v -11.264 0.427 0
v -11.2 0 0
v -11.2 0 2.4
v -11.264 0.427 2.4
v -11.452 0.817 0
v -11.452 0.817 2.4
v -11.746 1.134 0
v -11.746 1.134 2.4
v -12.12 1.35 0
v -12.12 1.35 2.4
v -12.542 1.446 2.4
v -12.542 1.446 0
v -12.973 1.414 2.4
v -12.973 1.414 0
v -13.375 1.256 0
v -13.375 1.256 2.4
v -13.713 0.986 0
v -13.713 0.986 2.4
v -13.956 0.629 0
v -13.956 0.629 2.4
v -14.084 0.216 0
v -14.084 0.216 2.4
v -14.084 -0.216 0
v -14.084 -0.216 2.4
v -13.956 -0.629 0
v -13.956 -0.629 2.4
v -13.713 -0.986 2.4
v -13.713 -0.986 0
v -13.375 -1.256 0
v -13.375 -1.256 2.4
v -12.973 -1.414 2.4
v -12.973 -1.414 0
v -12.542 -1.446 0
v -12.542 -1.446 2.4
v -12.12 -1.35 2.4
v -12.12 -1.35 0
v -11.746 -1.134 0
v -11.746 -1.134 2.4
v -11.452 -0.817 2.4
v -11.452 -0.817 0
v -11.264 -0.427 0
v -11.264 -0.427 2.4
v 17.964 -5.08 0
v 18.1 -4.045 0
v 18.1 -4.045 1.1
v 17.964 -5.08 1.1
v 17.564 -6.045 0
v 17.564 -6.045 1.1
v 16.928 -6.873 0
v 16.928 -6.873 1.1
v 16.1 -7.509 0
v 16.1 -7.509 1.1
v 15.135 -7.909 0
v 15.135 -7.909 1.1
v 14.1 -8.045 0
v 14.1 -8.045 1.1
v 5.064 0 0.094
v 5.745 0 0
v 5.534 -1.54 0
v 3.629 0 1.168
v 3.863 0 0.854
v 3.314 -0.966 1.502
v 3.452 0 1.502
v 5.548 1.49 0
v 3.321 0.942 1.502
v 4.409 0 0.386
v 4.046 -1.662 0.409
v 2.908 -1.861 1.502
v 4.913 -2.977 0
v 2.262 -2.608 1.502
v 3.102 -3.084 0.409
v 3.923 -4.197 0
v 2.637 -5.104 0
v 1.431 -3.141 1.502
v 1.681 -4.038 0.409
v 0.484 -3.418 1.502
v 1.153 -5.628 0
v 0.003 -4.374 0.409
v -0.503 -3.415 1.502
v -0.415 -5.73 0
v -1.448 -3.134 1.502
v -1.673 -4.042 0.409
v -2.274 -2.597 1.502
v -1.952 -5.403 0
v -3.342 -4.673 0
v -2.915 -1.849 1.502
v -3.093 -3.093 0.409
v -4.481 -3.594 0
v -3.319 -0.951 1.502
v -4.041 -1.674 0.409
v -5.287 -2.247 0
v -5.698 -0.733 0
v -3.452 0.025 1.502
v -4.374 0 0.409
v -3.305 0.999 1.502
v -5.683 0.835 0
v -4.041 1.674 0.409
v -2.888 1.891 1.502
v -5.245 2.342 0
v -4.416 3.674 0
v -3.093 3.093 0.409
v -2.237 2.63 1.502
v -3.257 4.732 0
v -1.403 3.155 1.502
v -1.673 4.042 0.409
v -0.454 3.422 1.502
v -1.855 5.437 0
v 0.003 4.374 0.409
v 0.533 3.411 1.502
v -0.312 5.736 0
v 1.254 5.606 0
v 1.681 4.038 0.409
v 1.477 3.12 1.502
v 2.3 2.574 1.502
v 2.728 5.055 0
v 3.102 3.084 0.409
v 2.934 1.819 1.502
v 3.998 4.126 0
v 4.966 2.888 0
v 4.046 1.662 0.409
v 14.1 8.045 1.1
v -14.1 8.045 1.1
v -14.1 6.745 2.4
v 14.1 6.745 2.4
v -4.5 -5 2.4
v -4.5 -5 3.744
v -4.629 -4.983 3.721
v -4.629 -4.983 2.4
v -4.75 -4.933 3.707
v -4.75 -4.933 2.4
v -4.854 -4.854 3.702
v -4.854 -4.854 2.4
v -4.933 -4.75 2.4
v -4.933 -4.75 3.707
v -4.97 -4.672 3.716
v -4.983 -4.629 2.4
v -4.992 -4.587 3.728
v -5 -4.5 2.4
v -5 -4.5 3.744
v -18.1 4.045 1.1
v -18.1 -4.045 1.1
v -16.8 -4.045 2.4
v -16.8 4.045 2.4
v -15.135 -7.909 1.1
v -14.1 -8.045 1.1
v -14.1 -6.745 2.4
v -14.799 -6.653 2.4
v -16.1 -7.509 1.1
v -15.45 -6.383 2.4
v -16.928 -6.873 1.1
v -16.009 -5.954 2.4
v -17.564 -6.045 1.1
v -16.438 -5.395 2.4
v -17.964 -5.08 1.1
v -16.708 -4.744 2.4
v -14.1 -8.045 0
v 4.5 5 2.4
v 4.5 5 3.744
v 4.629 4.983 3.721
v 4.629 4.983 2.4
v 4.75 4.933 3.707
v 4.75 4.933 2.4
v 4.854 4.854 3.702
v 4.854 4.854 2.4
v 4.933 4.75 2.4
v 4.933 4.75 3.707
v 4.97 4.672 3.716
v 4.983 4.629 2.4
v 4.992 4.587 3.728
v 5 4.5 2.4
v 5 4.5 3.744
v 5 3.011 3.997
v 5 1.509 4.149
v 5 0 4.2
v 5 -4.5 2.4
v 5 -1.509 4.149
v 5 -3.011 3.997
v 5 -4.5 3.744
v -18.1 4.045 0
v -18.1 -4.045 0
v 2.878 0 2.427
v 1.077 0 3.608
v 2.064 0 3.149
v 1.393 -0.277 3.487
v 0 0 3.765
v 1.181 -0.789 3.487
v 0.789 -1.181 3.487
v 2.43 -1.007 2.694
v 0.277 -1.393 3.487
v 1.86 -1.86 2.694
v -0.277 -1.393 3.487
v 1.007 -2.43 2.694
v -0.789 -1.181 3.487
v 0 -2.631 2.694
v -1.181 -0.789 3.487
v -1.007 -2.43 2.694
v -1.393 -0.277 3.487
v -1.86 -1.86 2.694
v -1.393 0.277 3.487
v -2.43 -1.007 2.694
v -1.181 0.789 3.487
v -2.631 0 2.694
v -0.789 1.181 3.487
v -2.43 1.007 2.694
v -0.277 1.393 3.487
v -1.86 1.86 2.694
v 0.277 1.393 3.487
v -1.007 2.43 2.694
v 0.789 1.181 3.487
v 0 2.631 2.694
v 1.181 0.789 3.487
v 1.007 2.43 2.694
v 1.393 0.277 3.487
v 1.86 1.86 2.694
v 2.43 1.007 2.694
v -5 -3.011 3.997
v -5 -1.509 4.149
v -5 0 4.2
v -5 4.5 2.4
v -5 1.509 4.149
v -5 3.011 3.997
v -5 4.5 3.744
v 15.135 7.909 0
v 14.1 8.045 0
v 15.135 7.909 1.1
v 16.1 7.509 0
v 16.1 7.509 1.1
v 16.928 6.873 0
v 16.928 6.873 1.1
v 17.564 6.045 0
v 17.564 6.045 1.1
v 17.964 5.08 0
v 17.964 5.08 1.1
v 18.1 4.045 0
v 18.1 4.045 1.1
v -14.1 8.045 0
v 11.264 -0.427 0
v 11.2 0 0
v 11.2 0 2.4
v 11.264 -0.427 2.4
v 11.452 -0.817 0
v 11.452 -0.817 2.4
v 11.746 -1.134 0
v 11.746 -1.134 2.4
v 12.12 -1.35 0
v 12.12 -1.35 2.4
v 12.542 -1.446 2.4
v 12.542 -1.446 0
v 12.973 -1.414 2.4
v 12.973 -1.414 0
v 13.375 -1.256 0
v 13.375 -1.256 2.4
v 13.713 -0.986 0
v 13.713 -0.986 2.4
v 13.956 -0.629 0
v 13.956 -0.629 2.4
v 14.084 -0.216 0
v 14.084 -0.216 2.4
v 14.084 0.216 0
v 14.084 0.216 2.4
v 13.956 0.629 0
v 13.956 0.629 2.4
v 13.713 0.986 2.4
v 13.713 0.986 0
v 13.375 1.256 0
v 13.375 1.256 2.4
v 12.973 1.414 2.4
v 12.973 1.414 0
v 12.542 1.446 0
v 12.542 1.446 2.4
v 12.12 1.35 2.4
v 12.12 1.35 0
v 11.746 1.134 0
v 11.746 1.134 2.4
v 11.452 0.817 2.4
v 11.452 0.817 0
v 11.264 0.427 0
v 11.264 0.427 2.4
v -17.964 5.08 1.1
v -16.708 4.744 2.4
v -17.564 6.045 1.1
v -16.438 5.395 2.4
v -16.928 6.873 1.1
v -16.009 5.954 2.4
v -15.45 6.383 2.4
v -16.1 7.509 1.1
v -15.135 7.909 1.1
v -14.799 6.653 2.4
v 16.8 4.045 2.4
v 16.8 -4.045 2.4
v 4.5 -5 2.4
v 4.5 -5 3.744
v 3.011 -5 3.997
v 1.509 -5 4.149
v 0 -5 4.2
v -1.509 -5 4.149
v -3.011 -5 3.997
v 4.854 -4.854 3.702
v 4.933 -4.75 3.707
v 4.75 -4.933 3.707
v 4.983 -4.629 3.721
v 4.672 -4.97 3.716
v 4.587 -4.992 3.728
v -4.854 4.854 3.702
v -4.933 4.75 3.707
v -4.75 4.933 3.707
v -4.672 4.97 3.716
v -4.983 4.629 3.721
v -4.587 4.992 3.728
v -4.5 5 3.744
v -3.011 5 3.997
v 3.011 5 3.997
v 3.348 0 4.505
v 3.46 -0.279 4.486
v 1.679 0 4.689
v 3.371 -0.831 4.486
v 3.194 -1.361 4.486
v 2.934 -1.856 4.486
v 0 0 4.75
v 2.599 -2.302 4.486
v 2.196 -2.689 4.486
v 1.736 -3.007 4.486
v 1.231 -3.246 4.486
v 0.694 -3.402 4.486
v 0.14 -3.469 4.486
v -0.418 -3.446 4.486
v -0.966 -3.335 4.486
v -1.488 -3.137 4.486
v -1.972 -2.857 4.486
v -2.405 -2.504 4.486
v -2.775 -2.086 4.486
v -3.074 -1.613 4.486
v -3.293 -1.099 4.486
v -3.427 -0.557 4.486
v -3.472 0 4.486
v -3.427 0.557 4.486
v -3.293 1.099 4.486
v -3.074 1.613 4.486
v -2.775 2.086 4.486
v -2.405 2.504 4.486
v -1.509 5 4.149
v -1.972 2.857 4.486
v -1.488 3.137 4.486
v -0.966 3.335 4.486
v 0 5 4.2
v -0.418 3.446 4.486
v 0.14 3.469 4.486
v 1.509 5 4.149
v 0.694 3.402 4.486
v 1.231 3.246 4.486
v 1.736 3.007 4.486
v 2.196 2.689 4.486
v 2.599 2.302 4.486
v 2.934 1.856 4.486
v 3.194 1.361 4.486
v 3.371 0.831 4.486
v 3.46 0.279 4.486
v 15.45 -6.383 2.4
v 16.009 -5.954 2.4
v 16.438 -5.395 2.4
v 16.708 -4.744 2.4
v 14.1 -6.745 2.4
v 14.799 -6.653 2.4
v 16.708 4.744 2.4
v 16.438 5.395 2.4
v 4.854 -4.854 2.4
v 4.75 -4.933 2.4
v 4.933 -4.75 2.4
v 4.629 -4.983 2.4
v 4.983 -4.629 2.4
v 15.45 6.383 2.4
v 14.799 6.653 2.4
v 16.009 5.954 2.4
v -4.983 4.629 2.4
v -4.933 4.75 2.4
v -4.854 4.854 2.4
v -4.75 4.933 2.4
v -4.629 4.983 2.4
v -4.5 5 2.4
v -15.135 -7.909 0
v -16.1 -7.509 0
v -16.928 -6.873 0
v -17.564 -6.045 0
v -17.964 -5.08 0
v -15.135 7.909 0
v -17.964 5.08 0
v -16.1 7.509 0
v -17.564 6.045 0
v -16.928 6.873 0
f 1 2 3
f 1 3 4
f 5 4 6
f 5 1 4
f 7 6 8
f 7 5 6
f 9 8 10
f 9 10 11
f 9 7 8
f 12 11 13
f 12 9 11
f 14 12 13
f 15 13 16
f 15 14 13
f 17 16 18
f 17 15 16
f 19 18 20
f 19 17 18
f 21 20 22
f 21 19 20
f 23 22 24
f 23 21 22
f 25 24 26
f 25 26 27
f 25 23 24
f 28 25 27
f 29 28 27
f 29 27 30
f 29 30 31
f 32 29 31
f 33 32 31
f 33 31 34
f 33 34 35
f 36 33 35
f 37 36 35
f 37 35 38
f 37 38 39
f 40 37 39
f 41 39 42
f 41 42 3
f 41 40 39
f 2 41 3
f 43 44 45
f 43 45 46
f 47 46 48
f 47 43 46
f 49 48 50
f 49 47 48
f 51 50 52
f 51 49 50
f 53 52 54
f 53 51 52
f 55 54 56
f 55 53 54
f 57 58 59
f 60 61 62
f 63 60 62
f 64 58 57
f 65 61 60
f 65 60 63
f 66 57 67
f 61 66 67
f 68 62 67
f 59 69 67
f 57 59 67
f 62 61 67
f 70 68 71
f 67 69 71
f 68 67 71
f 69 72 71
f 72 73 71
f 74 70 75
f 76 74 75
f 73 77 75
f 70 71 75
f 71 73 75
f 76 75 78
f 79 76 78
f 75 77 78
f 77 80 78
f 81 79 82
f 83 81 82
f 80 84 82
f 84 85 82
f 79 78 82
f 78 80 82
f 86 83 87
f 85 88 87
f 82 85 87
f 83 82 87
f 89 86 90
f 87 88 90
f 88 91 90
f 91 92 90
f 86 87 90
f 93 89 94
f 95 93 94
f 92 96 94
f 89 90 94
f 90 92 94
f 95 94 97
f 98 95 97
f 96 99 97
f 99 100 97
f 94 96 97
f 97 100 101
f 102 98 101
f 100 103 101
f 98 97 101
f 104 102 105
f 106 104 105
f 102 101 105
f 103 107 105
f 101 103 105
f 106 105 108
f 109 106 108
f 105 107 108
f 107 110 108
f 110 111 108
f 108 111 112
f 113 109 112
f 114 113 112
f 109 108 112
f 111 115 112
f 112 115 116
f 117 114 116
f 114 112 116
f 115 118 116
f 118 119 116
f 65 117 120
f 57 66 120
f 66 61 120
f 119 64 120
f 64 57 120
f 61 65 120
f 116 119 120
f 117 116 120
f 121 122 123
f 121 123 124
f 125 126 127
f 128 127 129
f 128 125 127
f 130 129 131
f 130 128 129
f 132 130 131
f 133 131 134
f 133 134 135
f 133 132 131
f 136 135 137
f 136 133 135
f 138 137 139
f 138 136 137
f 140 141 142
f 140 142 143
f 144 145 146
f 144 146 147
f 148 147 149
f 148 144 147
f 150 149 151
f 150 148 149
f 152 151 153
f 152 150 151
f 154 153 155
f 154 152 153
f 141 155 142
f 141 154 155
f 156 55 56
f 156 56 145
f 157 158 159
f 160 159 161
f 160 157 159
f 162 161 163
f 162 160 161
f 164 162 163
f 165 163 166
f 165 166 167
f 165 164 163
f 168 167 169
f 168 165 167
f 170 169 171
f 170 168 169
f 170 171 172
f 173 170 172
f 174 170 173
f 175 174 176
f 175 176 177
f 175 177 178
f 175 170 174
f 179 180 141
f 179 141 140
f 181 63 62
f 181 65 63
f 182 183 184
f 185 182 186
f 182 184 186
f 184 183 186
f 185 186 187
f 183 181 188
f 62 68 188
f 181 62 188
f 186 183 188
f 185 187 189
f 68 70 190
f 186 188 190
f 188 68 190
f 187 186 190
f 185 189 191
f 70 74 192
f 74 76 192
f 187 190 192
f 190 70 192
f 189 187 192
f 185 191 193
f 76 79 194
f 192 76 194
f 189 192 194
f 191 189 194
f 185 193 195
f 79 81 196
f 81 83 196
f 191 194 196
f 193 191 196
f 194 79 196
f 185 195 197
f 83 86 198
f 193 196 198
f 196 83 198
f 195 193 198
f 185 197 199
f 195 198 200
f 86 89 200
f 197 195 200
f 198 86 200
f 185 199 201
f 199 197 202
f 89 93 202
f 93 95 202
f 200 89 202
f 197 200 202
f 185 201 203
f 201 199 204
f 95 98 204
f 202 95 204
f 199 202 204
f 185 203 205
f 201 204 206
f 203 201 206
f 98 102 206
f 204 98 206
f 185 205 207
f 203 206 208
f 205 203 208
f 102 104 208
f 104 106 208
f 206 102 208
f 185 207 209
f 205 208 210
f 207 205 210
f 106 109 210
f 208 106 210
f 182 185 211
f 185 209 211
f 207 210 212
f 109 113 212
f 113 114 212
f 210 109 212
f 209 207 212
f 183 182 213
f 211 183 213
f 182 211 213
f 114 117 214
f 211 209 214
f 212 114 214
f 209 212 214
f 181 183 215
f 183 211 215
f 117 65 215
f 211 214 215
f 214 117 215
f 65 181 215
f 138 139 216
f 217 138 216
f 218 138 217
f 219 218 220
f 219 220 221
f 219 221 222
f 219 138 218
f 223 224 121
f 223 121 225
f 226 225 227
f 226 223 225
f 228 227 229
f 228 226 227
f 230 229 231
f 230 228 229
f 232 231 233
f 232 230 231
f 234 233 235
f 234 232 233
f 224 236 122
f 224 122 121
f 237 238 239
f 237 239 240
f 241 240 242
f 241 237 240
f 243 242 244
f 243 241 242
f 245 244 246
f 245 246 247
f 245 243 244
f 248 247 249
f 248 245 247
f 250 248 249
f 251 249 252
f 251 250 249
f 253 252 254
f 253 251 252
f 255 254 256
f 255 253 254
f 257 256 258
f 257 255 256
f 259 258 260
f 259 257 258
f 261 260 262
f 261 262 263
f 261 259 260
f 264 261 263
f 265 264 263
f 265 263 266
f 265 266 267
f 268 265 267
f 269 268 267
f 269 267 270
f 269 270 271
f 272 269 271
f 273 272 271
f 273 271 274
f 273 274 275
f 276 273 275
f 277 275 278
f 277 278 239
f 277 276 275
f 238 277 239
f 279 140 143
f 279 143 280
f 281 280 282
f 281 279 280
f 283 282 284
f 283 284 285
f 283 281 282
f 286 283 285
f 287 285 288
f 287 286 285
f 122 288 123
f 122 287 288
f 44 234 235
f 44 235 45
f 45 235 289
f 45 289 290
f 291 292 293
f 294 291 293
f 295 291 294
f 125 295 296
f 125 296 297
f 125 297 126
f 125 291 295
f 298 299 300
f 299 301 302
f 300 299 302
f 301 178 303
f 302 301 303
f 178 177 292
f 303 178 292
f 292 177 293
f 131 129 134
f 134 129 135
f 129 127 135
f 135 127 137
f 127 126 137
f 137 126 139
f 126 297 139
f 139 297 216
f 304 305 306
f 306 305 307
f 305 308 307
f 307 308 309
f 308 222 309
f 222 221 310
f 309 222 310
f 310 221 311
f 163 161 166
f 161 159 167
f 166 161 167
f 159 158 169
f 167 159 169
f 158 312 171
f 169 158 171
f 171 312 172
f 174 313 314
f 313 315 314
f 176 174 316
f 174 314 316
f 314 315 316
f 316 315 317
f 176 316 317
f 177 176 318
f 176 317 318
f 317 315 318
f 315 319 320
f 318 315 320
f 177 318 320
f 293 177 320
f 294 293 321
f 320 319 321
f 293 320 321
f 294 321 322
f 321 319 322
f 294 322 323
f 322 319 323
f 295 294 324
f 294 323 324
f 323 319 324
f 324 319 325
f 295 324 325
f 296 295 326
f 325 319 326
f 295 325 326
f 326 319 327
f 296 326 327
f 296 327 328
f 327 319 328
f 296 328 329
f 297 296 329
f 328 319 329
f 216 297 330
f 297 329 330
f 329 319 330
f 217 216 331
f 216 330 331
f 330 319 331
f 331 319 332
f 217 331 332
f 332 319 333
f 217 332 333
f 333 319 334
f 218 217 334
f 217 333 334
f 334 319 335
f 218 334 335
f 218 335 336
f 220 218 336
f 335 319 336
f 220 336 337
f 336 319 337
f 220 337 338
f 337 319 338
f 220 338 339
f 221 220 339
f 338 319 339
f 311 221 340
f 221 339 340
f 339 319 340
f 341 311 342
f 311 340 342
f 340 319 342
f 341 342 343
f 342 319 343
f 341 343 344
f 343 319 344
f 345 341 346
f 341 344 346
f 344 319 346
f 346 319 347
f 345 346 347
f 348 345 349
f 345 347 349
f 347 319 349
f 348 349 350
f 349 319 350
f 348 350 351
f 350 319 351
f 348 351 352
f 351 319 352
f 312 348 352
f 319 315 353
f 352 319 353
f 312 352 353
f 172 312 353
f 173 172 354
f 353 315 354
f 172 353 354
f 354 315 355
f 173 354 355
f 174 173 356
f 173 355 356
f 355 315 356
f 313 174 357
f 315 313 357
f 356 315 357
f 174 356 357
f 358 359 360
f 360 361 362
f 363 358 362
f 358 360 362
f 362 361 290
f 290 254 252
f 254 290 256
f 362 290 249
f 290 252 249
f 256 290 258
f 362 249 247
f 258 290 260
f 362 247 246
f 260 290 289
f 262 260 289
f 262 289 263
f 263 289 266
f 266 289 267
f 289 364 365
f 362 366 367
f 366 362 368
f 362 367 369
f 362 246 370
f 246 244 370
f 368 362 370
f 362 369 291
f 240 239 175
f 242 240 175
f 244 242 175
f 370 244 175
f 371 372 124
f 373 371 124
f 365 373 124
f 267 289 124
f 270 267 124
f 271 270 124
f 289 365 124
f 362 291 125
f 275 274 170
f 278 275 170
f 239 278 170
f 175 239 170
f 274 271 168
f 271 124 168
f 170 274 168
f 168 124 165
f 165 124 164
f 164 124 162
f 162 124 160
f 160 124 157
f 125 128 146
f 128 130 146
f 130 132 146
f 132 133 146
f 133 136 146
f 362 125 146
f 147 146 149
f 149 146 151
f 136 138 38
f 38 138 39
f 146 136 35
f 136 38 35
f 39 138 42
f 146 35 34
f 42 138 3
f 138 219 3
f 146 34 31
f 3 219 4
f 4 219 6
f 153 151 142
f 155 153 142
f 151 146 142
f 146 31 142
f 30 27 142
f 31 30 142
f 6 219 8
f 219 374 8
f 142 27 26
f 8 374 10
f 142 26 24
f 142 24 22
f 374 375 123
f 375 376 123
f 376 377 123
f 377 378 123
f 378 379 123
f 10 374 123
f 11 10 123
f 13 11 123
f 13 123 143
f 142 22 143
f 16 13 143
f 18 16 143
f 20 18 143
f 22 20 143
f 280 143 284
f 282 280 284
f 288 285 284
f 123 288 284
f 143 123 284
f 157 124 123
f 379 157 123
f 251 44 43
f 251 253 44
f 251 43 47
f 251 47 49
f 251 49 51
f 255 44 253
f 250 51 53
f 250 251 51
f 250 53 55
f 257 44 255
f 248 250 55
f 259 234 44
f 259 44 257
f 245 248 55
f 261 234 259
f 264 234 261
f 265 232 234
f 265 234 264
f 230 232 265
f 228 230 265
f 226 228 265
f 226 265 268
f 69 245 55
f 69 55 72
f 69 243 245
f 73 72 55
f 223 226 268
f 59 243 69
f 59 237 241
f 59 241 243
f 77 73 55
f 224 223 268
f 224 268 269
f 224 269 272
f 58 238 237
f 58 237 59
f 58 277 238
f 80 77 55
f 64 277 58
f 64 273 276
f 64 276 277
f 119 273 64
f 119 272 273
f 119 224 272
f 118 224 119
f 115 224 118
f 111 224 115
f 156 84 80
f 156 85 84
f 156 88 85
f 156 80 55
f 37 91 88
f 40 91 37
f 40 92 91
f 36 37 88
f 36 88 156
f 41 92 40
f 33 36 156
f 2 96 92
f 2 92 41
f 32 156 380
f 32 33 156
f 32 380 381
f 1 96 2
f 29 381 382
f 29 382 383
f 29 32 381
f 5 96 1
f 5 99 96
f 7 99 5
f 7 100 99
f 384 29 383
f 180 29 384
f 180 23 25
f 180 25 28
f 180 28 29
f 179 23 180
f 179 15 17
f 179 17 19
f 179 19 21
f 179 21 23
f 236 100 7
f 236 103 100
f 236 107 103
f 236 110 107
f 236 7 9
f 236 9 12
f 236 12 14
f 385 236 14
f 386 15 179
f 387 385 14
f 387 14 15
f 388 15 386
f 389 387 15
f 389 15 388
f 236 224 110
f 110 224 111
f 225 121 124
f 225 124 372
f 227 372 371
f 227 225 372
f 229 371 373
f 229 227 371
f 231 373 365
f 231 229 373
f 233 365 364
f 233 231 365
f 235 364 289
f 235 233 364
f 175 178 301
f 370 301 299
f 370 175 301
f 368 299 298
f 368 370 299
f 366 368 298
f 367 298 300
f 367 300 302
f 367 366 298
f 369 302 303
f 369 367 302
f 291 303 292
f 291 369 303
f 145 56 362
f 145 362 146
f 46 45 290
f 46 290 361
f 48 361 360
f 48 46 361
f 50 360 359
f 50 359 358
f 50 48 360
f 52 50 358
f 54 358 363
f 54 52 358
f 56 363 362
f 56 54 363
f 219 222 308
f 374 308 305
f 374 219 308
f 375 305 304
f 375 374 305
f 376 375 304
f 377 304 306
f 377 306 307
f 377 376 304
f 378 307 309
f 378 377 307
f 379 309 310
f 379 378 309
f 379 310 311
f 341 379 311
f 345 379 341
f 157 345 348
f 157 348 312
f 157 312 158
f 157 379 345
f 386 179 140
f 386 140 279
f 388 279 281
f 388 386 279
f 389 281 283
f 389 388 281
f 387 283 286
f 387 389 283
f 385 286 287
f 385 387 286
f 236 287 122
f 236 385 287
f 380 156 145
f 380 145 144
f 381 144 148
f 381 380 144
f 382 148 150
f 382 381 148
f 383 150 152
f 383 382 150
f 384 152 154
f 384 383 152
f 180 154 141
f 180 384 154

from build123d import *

# Parameters (mm, degrees)
IZIM1_R                     = 1.45
Y_KSEKLIK_EKSTR_ZYON1_DEPTH = 2.4
Y_KSEKLIK_EKSTR_ZYON2_DEPTH = 2.35
PAH1_SIZE                   = 1.3
RADYUS1_R                   = 2.5


with BuildPart() as part:
    # Çizim1 → Yükseklik-Ekstrüzyon1 (new body)
    with BuildSketch(Plane.XY):
        with BuildLine():
            Line((-14.1, 8.045), (14.1, 8.045))
            ThreePointArc((14.1, 8.045), (16.928427125, 6.873427125), (18.1, 4.045))
            Line((18.1, 4.045), (18.1, -4.045))
            ThreePointArc((18.1, -4.045), (16.928427125, -6.873427125), (14.1, -8.045))
            Line((14.1, -8.045), (-14.1, -8.045))
            ThreePointArc((-14.1, -8.045), (-16.928427125, -6.873427125), (-18.1, -4.045))
            Line((-18.1, -4.045), (-18.1, 4.045))
            ThreePointArc((-18.1, 4.045), (-16.928427125, 6.873427125), (-14.1, 8.045))
        make_face()
        with Locations((-12.65, 0)):
            Circle(IZIM1_R, mode=Mode.SUBTRACT)
        with Locations(Location((12.65, 0, 0), (0, 0, 180))):
            Circle(IZIM1_R, mode=Mode.SUBTRACT)
    extrude(amount=Y_KSEKLIK_EKSTR_ZYON1_DEPTH)

    # Çizim2 → Yükseklik-Ekstrüzyon2 (add)
    with BuildSketch(Plane.XY.offset(2.4)):
        with BuildLine():
            Line((-4.5, 5), (4.5, 5))
            ThreePointArc((4.5, 5), (4.853553391, 4.853553391), (5, 4.5))
            Line((5, 4.5), (5, -4.5))
            ThreePointArc((5, -4.5), (4.853553391, -4.853553391), (4.5, -5))
            Line((4.5, -5), (-4.5, -5))
            ThreePointArc((-4.5, -5), (-4.853553391, -4.853553391), (-5, -4.5))
            Line((-5, -4.5), (-5, 4.5))
            ThreePointArc((-5, 4.5), (-4.853553391, 4.853553391), (-4.5, 5))
        make_face()
    extrude(amount=Y_KSEKLIK_EKSTR_ZYON2_DEPTH)

    # Çizim3 → Kes-Döndür1 (revolve, cut)
    with BuildSketch(Plane(origin=(0, 0, 0), x_dir=(1, 0, 0), z_dir=(0, 1, 0))):
        with BuildLine():
            Line((0, -8.133060599), (11.181129459, -8.714892386))
            Line((11.181129459, -8.714892386), (7.979795791, -3.321493976))
            ThreePointArc((7.979795791, -3.321493976), (4.05332488, -4.390057277), (0, -4.75))
            Line((0, -4.75), (0, -8.133060599))
        make_face()
        with BuildLine():
            Line((3.765, 0), (5.976478481, 3.08469305))
            Line((5.976478481, 3.08469305), (3.765, 3.765))
            Line((3.765, 3.765), (0, 3.765))
            Line((0, 3.765), (0, -3.765))
            ThreePointArc((0, -3.765), (2.662257031, -2.662257031), (3.765, 0))
        make_face()
    revolve(axis=Axis((0, 0, 8.133060599), (0, 0, -1)), mode=Mode.SUBTRACT)

    # Pah1
    pah1_edges = [part.edges().sort_by_distance(p)[0] for p in [
        (16.928427125, -6.873427125, 2.4),
        (18.1, 0, 2.4),
        (16.928427125, 6.873427125, 2.4),
        (0, 8.045, 2.4),
        (-16.928427125, 6.873427125, 2.4),
        (-18.1, 0, 2.4),
        (-16.928427125, -6.873427125, 2.4),
        (0, -8.045, 2.4),
    ]]
    chamfer(pah1_edges, length=PAH1_SIZE)

    # Radyus1
    radyus1_edges = [part.edges().sort_by_distance(p)[0] for p in [
        (-3.765, 0, 0),
    ]]
    fillet(radyus1_edges, radius=RADYUS1_R)


solid = part.part
